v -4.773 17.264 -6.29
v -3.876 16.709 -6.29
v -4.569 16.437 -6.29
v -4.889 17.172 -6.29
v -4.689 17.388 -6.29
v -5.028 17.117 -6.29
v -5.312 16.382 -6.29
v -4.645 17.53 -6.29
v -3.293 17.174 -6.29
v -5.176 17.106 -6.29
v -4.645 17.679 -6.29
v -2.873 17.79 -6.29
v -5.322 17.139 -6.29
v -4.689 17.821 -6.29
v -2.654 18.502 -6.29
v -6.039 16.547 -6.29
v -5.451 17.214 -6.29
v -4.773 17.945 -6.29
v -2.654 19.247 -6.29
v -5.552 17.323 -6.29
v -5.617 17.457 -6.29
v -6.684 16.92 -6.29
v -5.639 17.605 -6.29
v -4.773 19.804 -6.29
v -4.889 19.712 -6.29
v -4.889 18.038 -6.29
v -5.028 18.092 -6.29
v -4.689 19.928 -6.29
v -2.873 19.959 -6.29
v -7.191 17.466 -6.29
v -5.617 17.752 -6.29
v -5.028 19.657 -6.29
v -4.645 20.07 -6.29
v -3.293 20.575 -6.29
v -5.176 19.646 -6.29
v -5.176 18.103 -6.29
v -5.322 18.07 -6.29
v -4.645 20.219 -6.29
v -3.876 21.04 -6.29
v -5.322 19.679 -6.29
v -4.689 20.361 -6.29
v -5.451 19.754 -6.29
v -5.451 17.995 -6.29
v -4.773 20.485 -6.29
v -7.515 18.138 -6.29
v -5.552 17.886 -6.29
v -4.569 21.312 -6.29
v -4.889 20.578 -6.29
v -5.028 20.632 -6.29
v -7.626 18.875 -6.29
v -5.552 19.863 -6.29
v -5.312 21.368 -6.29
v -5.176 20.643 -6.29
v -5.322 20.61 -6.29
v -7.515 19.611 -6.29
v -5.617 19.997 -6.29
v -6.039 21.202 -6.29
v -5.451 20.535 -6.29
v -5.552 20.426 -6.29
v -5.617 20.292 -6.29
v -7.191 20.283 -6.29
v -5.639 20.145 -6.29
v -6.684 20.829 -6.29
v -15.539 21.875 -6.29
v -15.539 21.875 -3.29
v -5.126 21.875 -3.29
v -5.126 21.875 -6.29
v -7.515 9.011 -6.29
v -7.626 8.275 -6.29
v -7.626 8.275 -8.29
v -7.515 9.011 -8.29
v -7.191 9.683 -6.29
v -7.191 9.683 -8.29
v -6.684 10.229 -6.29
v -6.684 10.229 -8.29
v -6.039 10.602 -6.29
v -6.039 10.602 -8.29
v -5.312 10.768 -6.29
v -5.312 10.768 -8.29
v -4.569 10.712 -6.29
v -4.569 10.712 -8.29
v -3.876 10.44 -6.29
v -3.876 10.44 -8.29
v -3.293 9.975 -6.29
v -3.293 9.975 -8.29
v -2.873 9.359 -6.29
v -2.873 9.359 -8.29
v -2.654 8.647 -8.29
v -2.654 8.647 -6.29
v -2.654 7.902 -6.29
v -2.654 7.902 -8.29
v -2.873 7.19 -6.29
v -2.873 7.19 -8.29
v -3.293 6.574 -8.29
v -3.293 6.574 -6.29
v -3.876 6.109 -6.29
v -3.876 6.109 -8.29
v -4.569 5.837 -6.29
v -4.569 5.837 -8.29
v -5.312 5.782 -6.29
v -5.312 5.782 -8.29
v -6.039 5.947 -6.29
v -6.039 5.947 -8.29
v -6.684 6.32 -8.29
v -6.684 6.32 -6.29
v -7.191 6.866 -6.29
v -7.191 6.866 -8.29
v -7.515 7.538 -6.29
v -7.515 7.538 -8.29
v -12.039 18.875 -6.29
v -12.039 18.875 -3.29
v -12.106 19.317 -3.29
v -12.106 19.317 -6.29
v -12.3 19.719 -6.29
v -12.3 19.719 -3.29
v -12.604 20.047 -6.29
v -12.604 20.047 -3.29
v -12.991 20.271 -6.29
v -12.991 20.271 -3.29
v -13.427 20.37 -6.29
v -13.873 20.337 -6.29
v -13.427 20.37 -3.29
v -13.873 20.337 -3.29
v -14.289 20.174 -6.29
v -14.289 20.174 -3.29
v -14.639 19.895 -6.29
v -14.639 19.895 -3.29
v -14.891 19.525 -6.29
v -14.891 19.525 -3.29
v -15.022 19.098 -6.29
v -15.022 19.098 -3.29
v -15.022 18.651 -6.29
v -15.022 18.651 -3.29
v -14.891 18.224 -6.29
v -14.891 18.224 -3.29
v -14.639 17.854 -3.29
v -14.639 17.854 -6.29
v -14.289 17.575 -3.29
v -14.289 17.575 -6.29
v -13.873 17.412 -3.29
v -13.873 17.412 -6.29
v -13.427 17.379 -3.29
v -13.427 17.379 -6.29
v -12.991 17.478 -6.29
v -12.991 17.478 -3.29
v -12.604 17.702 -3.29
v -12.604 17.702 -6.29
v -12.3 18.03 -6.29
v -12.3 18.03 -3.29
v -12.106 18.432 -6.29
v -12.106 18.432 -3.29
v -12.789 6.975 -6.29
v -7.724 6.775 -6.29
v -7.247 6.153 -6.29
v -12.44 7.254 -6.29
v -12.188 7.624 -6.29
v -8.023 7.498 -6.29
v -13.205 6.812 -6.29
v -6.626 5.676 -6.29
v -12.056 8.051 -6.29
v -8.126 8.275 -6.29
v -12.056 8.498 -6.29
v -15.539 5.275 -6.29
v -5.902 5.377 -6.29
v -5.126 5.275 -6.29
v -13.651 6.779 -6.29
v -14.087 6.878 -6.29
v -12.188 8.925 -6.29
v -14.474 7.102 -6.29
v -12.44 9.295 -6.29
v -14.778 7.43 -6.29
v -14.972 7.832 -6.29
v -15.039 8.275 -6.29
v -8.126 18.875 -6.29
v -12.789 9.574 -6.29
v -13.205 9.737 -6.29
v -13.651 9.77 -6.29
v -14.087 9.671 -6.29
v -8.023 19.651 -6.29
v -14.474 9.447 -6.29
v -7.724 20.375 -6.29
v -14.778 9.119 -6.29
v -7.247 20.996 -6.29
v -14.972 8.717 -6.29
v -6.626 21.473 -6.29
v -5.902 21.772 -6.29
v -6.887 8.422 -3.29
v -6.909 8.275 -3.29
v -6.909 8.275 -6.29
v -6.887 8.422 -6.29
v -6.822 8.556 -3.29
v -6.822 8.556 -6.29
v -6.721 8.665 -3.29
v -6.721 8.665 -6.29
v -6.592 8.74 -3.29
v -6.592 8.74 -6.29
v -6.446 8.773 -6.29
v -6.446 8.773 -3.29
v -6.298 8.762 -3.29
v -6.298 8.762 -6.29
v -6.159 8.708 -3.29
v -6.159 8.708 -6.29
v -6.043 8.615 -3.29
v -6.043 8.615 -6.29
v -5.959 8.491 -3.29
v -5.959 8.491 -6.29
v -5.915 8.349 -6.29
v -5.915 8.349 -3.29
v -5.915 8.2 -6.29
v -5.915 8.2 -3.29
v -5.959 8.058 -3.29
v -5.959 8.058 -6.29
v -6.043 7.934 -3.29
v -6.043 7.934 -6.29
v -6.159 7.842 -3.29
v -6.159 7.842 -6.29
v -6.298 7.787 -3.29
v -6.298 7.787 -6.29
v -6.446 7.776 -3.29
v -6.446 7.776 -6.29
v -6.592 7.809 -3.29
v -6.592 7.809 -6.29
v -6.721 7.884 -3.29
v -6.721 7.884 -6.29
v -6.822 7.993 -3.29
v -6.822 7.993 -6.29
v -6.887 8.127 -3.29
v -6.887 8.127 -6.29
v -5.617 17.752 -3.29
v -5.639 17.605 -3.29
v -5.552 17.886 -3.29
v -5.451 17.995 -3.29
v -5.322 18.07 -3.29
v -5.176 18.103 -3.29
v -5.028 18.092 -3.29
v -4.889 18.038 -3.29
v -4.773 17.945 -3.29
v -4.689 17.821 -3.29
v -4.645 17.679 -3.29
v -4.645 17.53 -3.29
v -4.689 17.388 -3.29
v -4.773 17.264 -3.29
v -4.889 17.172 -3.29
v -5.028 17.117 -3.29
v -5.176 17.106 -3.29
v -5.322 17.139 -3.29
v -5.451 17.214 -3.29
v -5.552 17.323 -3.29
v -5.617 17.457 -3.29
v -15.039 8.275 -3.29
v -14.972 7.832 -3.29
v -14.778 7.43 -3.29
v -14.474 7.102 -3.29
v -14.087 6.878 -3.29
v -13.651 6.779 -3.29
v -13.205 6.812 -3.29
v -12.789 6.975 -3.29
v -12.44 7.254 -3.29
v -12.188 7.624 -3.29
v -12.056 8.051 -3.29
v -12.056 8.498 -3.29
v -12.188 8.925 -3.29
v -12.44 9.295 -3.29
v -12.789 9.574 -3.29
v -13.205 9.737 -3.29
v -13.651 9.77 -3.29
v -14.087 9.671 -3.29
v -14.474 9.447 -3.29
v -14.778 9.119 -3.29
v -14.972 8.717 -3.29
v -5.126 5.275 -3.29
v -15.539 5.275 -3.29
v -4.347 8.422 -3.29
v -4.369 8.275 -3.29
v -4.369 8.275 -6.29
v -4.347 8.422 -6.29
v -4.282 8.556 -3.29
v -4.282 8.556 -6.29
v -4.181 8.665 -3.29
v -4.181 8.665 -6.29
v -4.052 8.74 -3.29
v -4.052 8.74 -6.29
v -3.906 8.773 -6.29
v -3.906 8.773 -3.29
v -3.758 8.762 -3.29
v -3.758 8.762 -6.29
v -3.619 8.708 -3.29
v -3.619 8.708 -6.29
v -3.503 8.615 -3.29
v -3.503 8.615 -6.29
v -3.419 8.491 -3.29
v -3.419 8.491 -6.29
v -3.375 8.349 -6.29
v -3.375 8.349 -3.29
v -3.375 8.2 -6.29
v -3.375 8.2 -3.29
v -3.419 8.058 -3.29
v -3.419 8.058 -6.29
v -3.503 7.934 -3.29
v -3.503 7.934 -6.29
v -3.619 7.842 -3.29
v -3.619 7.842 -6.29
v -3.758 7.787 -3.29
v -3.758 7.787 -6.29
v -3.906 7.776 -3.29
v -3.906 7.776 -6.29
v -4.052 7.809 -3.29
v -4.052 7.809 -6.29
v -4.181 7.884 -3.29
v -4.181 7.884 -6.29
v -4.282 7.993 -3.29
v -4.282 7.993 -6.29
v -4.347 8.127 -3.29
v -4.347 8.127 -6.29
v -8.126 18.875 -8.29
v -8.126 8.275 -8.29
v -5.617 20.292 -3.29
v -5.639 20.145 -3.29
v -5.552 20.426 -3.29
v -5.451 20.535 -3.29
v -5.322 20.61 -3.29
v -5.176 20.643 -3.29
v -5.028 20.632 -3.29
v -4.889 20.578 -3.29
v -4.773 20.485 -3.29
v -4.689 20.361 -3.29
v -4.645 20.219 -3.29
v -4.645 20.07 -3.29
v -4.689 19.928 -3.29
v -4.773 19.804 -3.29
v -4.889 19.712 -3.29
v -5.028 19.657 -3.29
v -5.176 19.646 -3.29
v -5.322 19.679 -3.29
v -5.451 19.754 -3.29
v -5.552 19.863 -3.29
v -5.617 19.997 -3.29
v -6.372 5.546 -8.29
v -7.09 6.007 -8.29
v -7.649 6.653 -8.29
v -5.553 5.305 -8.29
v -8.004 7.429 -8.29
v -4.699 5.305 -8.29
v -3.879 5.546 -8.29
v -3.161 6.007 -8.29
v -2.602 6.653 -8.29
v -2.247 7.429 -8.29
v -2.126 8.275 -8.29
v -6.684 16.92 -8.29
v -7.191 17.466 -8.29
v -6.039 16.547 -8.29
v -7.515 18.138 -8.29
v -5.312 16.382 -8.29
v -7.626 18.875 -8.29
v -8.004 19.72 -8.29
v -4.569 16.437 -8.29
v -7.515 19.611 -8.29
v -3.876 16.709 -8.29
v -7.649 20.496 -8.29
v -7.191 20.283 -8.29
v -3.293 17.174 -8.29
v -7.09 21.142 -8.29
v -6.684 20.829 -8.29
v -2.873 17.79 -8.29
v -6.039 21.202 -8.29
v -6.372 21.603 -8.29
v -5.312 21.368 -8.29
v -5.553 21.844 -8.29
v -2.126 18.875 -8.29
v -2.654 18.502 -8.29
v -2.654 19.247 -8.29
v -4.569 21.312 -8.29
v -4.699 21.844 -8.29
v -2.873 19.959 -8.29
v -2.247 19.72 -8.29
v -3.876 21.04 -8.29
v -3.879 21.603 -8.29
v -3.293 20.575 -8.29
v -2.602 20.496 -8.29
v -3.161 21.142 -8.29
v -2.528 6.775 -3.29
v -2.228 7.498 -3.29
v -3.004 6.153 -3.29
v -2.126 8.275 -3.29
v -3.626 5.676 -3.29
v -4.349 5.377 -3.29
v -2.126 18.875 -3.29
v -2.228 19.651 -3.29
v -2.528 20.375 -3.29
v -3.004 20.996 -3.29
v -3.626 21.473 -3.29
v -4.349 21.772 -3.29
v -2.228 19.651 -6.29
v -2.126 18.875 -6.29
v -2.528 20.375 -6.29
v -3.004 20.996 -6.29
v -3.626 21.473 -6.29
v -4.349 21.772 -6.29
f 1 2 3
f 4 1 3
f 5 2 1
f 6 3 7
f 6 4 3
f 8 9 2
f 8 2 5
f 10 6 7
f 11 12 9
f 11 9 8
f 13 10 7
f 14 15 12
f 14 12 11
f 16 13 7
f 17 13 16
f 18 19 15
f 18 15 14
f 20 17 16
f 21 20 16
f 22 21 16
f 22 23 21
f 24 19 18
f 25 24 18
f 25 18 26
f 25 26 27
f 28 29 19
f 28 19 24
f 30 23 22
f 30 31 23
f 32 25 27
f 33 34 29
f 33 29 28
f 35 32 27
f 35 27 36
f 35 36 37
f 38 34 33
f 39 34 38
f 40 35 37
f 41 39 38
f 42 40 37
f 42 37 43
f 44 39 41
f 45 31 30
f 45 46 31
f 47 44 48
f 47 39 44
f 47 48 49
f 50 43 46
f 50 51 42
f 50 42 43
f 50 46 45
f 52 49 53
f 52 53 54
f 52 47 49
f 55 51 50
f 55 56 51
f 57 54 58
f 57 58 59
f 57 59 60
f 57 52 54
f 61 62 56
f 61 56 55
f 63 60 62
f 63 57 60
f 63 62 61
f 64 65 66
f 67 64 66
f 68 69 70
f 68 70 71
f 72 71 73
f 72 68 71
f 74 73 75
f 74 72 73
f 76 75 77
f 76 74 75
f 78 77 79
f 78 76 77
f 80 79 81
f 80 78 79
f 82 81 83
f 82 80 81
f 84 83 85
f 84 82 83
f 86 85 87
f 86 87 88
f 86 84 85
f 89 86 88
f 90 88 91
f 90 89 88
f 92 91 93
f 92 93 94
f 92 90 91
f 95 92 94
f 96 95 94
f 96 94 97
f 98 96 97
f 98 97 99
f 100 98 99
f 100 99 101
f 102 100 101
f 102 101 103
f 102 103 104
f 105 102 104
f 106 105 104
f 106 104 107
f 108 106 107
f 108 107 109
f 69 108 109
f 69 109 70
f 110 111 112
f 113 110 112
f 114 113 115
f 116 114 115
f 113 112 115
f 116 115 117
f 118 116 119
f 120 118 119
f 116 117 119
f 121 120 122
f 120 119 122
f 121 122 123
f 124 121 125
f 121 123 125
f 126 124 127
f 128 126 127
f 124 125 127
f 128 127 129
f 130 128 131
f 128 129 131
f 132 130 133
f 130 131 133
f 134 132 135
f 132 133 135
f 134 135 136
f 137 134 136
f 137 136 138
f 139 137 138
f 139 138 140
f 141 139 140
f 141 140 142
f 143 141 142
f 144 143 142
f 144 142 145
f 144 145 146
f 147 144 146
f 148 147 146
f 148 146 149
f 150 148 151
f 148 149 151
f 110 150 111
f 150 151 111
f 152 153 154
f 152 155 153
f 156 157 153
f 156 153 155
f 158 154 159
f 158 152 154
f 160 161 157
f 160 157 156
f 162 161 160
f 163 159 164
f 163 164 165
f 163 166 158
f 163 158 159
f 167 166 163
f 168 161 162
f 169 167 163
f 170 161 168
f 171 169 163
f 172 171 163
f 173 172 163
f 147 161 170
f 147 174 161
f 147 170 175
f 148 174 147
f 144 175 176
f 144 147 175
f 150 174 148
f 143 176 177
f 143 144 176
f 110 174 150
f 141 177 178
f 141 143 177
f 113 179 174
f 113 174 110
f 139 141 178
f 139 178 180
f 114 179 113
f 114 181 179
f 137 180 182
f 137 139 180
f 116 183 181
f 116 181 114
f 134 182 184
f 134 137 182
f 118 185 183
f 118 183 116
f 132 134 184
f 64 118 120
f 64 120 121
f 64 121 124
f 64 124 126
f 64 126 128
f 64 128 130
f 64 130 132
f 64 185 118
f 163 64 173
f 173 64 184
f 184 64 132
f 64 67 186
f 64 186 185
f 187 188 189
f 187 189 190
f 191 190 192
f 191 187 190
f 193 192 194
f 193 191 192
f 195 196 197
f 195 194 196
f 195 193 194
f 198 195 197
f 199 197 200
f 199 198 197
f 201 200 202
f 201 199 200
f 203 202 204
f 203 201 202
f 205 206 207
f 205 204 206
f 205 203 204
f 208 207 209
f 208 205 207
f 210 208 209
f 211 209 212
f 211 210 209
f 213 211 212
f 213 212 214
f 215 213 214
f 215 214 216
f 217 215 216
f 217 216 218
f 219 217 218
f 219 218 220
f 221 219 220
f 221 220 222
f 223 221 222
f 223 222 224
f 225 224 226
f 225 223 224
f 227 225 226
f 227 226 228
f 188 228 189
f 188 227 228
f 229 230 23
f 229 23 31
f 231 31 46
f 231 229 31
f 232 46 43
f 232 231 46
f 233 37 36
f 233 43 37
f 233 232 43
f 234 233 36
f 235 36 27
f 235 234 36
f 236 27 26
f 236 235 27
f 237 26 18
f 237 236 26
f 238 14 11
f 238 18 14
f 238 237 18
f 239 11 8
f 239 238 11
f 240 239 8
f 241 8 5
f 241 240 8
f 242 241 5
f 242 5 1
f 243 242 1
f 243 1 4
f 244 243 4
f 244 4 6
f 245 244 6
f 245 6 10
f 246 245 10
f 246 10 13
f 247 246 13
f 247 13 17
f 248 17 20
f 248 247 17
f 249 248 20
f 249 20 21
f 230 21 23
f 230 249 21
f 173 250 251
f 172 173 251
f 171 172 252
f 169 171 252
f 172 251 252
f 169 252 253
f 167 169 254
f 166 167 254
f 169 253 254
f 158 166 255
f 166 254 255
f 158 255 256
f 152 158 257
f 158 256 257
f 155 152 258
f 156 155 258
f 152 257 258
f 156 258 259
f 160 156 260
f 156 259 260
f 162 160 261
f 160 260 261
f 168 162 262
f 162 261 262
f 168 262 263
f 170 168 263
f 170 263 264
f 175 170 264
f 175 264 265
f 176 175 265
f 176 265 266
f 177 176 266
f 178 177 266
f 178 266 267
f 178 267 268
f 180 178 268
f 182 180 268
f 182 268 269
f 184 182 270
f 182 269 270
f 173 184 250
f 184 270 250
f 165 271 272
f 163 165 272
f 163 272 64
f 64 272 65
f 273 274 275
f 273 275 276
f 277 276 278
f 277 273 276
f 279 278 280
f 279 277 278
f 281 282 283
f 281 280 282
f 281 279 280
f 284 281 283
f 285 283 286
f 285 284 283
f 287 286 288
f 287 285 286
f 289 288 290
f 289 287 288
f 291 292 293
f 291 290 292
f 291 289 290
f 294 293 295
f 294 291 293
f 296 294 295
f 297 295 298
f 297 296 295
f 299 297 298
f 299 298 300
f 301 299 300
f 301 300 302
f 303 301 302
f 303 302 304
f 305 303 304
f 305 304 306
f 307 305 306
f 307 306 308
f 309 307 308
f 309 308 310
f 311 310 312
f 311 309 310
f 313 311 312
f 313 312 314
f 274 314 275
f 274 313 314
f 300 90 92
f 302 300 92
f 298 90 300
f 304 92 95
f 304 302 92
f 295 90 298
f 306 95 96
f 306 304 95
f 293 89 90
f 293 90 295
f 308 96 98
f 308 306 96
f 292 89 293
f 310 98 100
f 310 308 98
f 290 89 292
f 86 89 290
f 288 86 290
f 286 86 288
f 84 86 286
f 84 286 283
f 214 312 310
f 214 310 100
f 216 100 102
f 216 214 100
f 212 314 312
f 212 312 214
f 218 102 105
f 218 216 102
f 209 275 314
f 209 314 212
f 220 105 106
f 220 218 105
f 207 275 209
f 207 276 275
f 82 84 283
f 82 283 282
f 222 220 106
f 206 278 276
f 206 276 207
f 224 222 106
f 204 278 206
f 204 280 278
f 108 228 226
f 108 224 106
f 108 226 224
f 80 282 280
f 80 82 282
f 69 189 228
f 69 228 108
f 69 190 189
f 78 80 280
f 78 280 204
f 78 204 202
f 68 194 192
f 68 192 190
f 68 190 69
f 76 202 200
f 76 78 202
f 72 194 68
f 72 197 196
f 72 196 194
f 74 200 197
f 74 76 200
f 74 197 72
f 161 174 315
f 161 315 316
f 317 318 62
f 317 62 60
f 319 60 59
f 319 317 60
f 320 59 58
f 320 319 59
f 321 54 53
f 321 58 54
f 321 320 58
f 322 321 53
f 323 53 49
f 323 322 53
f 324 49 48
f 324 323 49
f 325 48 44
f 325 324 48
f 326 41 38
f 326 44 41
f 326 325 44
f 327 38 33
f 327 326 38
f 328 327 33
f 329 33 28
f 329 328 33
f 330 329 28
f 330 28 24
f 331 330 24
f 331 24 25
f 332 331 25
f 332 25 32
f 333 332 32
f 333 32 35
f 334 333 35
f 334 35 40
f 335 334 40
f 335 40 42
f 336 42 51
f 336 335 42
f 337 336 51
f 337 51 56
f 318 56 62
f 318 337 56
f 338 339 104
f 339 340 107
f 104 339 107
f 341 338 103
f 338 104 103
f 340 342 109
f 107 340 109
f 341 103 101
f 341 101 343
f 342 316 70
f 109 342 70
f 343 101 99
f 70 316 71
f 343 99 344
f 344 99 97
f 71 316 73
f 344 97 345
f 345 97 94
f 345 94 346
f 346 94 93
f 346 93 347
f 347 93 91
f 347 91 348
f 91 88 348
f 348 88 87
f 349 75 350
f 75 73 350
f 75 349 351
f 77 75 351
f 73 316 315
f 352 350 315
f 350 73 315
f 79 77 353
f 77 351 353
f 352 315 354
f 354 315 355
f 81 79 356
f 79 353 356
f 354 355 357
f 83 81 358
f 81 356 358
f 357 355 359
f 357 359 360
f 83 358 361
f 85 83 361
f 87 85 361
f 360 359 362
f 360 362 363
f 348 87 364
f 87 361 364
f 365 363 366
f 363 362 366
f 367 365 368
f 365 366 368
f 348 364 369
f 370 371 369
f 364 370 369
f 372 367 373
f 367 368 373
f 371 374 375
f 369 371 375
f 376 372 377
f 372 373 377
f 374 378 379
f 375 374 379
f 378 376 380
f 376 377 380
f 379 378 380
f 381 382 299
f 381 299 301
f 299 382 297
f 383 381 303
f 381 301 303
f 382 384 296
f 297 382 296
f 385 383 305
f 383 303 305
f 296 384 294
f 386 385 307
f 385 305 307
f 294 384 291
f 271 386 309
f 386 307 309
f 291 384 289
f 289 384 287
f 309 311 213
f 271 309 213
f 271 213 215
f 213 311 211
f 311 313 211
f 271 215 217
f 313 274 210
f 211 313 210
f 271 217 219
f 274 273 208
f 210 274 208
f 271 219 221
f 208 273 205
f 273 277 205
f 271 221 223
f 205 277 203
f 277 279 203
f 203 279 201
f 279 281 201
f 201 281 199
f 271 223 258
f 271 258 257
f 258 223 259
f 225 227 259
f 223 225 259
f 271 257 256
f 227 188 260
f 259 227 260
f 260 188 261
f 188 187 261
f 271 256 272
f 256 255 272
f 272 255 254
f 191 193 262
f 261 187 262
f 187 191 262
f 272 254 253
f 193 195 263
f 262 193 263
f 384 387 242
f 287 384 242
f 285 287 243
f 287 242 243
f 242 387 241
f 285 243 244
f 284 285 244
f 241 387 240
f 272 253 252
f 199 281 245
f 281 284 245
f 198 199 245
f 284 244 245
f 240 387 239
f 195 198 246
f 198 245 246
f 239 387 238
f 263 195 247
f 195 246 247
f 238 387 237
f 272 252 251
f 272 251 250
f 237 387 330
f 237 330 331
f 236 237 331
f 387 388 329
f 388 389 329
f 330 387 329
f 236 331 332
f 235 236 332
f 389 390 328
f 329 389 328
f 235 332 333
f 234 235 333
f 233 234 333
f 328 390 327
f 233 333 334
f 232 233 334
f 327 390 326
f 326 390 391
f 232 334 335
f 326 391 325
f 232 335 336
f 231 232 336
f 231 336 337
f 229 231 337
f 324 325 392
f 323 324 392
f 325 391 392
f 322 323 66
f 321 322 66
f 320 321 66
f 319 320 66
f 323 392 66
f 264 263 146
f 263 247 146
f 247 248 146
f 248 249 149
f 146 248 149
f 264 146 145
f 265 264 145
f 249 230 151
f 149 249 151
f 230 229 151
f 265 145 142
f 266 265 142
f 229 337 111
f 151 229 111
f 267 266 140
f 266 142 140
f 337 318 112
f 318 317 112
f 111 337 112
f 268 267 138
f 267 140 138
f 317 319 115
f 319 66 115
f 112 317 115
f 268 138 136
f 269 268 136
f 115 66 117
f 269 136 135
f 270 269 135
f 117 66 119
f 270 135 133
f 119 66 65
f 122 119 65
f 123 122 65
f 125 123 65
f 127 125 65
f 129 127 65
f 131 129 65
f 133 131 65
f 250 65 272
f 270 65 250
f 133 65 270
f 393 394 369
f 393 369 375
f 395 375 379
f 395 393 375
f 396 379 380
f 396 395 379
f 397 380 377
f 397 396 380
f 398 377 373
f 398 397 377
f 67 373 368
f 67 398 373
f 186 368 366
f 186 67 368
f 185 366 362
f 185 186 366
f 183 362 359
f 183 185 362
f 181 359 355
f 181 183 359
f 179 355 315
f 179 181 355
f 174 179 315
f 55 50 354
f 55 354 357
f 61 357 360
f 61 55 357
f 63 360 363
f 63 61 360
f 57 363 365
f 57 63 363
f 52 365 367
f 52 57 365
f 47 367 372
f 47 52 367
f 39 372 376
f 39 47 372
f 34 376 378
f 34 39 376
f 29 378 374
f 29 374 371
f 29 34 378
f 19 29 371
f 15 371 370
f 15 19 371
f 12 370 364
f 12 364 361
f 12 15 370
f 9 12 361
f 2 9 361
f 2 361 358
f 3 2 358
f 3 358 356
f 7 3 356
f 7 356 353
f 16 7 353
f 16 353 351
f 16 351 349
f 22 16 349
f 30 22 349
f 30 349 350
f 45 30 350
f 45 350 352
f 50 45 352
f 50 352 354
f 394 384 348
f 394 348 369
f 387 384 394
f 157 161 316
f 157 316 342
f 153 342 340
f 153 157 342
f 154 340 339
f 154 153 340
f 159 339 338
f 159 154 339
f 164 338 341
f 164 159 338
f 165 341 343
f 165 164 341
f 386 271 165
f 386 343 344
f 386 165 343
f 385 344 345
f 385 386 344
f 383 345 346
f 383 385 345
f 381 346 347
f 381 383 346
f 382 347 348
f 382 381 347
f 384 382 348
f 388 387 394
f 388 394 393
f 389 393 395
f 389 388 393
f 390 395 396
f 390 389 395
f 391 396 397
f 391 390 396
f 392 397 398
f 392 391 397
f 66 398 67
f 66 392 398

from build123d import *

# Parameters (mm, degrees)
SKETCH1_R               = 2.5
BOSS_EXTRUDE1_DEPTH     = 5
SKETCH2_R               = 2.51348819
BOSS_EXTRUDE2_DEPTH     = 1
BOSS_EXTRUDE3_DEPTH     = 3
CUT_EXTRUDE1_DEPTH      = 28.128538457
CUT_EXTRUDE1_DEPTH_BACK = 28.128538457
SKETCH5_R               = 0.5
CUT_EXTRUDE2_START      = -10
SKETCH6_R               = 1.5
CUT_EXTRUDE2_DEPTH      = 10


with BuildPart() as part:
    # Sketch1 → Boss-Extrude1 (new body)
    with BuildSketch(Plane(origin=(0, 0, -3.289858219), x_dir=(-1, 0, 0), z_dir=(0, 0, -1))):
        with BuildLine():
            Line((2.125597577, 8.274515134), (2.125597577, 18.874515134))
            ThreePointArc((2.125597577, 18.874515134), (5.125597577, 21.874515134), (8.125597577, 18.874515134))
            Line((8.125597577, 18.874515134), (8.125597577, 8.274515134))
            ThreePointArc((8.125597577, 8.274515134), (5.125597577, 5.274515134), (2.125597577, 8.274515134))
        make_face()
        with Locations((5.125597577, 18.874515134)):
            Circle(SKETCH1_R, mode=Mode.SUBTRACT)
        with Locations((5.125597577, 8.274515134)):
            Circle(SKETCH1_R, mode=Mode.SUBTRACT)
    extrude(amount=BOSS_EXTRUDE1_DEPTH)

    # Sketch2 → Boss-Extrude2 (add)
    with BuildSketch(Plane(origin=(0, 0, -3.289858219), x_dir=(-1, 0, 0), z_dir=(0, 0, -1))):
        with Locations((5.139085766, 8.274515134)):
            Circle(SKETCH2_R)
        with Locations((5.139085766, 18.874515134)):
            Circle(SKETCH2_R)
    extrude(amount=BOSS_EXTRUDE2_DEPTH)

    # Sketch4 → Boss-Extrude3 (add)
    with BuildSketch(Plane(origin=(0, 0, -3.289858219), x_dir=(-1, 0, 0), z_dir=(0, 0, -1))):
        with BuildLine():
            Line((-9.960914234, 18.874515134), (-10.460914234, 18.874515134))
            Line((-10.460914234, 18.874515134), (-10.460914234, 8.274515134))
            Line((-10.460914234, 8.274515134), (-9.960914234, 8.274515134))
            ThreePointArc((-9.960914234, 8.274515134), (-8.460914234, 9.774515134), (-6.960914234, 8.274515134))
            Line((-6.960914234, 8.274515134), (5.139085766, 8.274515134))
            Line((5.139085766, 8.274515134), (12.039085766, 8.274515134))
            ThreePointArc((12.039085766, 8.274515134), (13.539085766, 9.774515134), (15.039085766, 8.274515134))
            Line((15.039085766, 8.274515134), (15.539085766, 8.274515134))
            Line((15.539085766, 8.274515134), (15.539085766, 18.874515134))
            Line((15.539085766, 18.874515134), (15.039085766, 18.874515134))
            ThreePointArc((15.039085766, 18.874515134), (13.539085766, 17.374515134), (12.039085766, 18.874515134))
            Line((12.039085766, 18.874515134), (5.139085766, 18.874515134))
            Line((5.139085766, 18.874515134), (-6.960914234, 18.874515134))
            ThreePointArc((-6.960914234, 18.874515134), (-8.460914234, 17.374515134), (-9.960914234, 18.874515134))
        make_face()
        with BuildLine():
            Line((15.539085766, 21.874515134), (5.125597577, 21.874515134))
            Line((5.125597577, 21.874515134), (-10.460914234, 21.874515134))
            Line((-10.460914234, 21.874515134), (-10.460914234, 18.874515134))
            Line((-10.460914234, 18.874515134), (-9.960914234, 18.874515134))
            ThreePointArc((-9.960914234, 18.874515134), (-8.460914234, 20.374515134), (-6.960914234, 18.874515134))
            Line((-6.960914234, 18.874515134), (5.139085766, 18.874515134))
            Line((5.139085766, 18.874515134), (12.039085766, 18.874515134))
            ThreePointArc((12.039085766, 18.874515134), (13.539085766, 20.374515134), (15.039085766, 18.874515134))
            Line((15.039085766, 18.874515134), (15.539085766, 18.874515134))
            Line((15.539085766, 18.874515134), (15.539085766, 21.874515134))
        make_face()
        with BuildLine():
            Line((-9.960914234, 8.274515134), (-10.460914234, 8.274515134))
            Line((-10.460914234, 8.274515134), (-10.460914234, 5.274515134))
            Line((-10.460914234, 5.274515134), (5.125597577, 5.274515134))
            Line((5.125597577, 5.274515134), (15.539085766, 5.274515134))
            Line((15.539085766, 5.274515134), (15.539085766, 8.274515134))
            Line((15.539085766, 8.274515134), (15.039085766, 8.274515134))
            ThreePointArc((15.039085766, 8.274515134), (13.539085766, 6.774515134), (12.039085766, 8.274515134))
            Line((12.039085766, 8.274515134), (5.139085766, 8.274515134))
            Line((5.139085766, 8.274515134), (-6.960914234, 8.274515134))
            ThreePointArc((-6.960914234, 8.274515134), (-8.460914234, 6.774515134), (-9.960914234, 8.274515134))
        make_face()
    extrude(amount=BOSS_EXTRUDE3_DEPTH)

    # Sketch5 → Cut-Extrude1 (cut, two sides: drawn at the far end of the back side and taken through both)
    with BuildSketch(Plane(origin=(0, 0, -4.289858219), x_dir=(-1, 0, 0), z_dir=(0, 0, -1)).offset(-CUT_EXTRUDE1_DEPTH_BACK)):
        with Locations((5.139085766, 20.144515134)):
            Circle(SKETCH5_R)
        with Locations((5.139085766, 17.604515134)):
            Circle(SKETCH5_R)
        with Locations((3.869085766, 8.274515134)):
            Circle(SKETCH5_R)
        with Locations((6.409085766, 8.274515134)):
            Circle(SKETCH5_R)
    extrude(amount=CUT_EXTRUDE1_DEPTH + CUT_EXTRUDE1_DEPTH_BACK, mode=Mode.SUBTRACT)

    # Sketch6 → Cut-Extrude2 (cut)
    with BuildSketch(Plane(origin=(0, 0, -6.289858219), x_dir=(-1, 0, 0), z_dir=(0, 0, -1)).offset(CUT_EXTRUDE2_START)):
        with BuildLine():
            Line((-10.460914234, 5.274515134), (5.125597577, 5.274515134))
            ThreePointArc((5.125597577, 5.274515134), (3.004277233, 6.15319479), (2.125597577, 8.274515134))
            Line((2.125597577, 8.274515134), (2.125597577, 18.874515134))
            ThreePointArc((2.125597577, 18.874515134), (3.004277233, 20.995835477), (5.125597577, 21.874515134))
            Line((5.125597577, 21.874515134), (-10.460914234, 21.874515134))
            Line((-10.460914234, 21.874515134), (-10.460914234, 5.274515134))
        make_face()
        with Locations((-8.460914234, 18.874515134)):
            Circle(SKETCH6_R, mode=Mode.SUBTRACT)
        with Locations((-8.460914234, 8.274515134)):
            Circle(SKETCH6_R, mode=Mode.SUBTRACT)
    extrude(amount=CUT_EXTRUDE2_DEPTH, mode=Mode.SUBTRACT)


solid = part.part
